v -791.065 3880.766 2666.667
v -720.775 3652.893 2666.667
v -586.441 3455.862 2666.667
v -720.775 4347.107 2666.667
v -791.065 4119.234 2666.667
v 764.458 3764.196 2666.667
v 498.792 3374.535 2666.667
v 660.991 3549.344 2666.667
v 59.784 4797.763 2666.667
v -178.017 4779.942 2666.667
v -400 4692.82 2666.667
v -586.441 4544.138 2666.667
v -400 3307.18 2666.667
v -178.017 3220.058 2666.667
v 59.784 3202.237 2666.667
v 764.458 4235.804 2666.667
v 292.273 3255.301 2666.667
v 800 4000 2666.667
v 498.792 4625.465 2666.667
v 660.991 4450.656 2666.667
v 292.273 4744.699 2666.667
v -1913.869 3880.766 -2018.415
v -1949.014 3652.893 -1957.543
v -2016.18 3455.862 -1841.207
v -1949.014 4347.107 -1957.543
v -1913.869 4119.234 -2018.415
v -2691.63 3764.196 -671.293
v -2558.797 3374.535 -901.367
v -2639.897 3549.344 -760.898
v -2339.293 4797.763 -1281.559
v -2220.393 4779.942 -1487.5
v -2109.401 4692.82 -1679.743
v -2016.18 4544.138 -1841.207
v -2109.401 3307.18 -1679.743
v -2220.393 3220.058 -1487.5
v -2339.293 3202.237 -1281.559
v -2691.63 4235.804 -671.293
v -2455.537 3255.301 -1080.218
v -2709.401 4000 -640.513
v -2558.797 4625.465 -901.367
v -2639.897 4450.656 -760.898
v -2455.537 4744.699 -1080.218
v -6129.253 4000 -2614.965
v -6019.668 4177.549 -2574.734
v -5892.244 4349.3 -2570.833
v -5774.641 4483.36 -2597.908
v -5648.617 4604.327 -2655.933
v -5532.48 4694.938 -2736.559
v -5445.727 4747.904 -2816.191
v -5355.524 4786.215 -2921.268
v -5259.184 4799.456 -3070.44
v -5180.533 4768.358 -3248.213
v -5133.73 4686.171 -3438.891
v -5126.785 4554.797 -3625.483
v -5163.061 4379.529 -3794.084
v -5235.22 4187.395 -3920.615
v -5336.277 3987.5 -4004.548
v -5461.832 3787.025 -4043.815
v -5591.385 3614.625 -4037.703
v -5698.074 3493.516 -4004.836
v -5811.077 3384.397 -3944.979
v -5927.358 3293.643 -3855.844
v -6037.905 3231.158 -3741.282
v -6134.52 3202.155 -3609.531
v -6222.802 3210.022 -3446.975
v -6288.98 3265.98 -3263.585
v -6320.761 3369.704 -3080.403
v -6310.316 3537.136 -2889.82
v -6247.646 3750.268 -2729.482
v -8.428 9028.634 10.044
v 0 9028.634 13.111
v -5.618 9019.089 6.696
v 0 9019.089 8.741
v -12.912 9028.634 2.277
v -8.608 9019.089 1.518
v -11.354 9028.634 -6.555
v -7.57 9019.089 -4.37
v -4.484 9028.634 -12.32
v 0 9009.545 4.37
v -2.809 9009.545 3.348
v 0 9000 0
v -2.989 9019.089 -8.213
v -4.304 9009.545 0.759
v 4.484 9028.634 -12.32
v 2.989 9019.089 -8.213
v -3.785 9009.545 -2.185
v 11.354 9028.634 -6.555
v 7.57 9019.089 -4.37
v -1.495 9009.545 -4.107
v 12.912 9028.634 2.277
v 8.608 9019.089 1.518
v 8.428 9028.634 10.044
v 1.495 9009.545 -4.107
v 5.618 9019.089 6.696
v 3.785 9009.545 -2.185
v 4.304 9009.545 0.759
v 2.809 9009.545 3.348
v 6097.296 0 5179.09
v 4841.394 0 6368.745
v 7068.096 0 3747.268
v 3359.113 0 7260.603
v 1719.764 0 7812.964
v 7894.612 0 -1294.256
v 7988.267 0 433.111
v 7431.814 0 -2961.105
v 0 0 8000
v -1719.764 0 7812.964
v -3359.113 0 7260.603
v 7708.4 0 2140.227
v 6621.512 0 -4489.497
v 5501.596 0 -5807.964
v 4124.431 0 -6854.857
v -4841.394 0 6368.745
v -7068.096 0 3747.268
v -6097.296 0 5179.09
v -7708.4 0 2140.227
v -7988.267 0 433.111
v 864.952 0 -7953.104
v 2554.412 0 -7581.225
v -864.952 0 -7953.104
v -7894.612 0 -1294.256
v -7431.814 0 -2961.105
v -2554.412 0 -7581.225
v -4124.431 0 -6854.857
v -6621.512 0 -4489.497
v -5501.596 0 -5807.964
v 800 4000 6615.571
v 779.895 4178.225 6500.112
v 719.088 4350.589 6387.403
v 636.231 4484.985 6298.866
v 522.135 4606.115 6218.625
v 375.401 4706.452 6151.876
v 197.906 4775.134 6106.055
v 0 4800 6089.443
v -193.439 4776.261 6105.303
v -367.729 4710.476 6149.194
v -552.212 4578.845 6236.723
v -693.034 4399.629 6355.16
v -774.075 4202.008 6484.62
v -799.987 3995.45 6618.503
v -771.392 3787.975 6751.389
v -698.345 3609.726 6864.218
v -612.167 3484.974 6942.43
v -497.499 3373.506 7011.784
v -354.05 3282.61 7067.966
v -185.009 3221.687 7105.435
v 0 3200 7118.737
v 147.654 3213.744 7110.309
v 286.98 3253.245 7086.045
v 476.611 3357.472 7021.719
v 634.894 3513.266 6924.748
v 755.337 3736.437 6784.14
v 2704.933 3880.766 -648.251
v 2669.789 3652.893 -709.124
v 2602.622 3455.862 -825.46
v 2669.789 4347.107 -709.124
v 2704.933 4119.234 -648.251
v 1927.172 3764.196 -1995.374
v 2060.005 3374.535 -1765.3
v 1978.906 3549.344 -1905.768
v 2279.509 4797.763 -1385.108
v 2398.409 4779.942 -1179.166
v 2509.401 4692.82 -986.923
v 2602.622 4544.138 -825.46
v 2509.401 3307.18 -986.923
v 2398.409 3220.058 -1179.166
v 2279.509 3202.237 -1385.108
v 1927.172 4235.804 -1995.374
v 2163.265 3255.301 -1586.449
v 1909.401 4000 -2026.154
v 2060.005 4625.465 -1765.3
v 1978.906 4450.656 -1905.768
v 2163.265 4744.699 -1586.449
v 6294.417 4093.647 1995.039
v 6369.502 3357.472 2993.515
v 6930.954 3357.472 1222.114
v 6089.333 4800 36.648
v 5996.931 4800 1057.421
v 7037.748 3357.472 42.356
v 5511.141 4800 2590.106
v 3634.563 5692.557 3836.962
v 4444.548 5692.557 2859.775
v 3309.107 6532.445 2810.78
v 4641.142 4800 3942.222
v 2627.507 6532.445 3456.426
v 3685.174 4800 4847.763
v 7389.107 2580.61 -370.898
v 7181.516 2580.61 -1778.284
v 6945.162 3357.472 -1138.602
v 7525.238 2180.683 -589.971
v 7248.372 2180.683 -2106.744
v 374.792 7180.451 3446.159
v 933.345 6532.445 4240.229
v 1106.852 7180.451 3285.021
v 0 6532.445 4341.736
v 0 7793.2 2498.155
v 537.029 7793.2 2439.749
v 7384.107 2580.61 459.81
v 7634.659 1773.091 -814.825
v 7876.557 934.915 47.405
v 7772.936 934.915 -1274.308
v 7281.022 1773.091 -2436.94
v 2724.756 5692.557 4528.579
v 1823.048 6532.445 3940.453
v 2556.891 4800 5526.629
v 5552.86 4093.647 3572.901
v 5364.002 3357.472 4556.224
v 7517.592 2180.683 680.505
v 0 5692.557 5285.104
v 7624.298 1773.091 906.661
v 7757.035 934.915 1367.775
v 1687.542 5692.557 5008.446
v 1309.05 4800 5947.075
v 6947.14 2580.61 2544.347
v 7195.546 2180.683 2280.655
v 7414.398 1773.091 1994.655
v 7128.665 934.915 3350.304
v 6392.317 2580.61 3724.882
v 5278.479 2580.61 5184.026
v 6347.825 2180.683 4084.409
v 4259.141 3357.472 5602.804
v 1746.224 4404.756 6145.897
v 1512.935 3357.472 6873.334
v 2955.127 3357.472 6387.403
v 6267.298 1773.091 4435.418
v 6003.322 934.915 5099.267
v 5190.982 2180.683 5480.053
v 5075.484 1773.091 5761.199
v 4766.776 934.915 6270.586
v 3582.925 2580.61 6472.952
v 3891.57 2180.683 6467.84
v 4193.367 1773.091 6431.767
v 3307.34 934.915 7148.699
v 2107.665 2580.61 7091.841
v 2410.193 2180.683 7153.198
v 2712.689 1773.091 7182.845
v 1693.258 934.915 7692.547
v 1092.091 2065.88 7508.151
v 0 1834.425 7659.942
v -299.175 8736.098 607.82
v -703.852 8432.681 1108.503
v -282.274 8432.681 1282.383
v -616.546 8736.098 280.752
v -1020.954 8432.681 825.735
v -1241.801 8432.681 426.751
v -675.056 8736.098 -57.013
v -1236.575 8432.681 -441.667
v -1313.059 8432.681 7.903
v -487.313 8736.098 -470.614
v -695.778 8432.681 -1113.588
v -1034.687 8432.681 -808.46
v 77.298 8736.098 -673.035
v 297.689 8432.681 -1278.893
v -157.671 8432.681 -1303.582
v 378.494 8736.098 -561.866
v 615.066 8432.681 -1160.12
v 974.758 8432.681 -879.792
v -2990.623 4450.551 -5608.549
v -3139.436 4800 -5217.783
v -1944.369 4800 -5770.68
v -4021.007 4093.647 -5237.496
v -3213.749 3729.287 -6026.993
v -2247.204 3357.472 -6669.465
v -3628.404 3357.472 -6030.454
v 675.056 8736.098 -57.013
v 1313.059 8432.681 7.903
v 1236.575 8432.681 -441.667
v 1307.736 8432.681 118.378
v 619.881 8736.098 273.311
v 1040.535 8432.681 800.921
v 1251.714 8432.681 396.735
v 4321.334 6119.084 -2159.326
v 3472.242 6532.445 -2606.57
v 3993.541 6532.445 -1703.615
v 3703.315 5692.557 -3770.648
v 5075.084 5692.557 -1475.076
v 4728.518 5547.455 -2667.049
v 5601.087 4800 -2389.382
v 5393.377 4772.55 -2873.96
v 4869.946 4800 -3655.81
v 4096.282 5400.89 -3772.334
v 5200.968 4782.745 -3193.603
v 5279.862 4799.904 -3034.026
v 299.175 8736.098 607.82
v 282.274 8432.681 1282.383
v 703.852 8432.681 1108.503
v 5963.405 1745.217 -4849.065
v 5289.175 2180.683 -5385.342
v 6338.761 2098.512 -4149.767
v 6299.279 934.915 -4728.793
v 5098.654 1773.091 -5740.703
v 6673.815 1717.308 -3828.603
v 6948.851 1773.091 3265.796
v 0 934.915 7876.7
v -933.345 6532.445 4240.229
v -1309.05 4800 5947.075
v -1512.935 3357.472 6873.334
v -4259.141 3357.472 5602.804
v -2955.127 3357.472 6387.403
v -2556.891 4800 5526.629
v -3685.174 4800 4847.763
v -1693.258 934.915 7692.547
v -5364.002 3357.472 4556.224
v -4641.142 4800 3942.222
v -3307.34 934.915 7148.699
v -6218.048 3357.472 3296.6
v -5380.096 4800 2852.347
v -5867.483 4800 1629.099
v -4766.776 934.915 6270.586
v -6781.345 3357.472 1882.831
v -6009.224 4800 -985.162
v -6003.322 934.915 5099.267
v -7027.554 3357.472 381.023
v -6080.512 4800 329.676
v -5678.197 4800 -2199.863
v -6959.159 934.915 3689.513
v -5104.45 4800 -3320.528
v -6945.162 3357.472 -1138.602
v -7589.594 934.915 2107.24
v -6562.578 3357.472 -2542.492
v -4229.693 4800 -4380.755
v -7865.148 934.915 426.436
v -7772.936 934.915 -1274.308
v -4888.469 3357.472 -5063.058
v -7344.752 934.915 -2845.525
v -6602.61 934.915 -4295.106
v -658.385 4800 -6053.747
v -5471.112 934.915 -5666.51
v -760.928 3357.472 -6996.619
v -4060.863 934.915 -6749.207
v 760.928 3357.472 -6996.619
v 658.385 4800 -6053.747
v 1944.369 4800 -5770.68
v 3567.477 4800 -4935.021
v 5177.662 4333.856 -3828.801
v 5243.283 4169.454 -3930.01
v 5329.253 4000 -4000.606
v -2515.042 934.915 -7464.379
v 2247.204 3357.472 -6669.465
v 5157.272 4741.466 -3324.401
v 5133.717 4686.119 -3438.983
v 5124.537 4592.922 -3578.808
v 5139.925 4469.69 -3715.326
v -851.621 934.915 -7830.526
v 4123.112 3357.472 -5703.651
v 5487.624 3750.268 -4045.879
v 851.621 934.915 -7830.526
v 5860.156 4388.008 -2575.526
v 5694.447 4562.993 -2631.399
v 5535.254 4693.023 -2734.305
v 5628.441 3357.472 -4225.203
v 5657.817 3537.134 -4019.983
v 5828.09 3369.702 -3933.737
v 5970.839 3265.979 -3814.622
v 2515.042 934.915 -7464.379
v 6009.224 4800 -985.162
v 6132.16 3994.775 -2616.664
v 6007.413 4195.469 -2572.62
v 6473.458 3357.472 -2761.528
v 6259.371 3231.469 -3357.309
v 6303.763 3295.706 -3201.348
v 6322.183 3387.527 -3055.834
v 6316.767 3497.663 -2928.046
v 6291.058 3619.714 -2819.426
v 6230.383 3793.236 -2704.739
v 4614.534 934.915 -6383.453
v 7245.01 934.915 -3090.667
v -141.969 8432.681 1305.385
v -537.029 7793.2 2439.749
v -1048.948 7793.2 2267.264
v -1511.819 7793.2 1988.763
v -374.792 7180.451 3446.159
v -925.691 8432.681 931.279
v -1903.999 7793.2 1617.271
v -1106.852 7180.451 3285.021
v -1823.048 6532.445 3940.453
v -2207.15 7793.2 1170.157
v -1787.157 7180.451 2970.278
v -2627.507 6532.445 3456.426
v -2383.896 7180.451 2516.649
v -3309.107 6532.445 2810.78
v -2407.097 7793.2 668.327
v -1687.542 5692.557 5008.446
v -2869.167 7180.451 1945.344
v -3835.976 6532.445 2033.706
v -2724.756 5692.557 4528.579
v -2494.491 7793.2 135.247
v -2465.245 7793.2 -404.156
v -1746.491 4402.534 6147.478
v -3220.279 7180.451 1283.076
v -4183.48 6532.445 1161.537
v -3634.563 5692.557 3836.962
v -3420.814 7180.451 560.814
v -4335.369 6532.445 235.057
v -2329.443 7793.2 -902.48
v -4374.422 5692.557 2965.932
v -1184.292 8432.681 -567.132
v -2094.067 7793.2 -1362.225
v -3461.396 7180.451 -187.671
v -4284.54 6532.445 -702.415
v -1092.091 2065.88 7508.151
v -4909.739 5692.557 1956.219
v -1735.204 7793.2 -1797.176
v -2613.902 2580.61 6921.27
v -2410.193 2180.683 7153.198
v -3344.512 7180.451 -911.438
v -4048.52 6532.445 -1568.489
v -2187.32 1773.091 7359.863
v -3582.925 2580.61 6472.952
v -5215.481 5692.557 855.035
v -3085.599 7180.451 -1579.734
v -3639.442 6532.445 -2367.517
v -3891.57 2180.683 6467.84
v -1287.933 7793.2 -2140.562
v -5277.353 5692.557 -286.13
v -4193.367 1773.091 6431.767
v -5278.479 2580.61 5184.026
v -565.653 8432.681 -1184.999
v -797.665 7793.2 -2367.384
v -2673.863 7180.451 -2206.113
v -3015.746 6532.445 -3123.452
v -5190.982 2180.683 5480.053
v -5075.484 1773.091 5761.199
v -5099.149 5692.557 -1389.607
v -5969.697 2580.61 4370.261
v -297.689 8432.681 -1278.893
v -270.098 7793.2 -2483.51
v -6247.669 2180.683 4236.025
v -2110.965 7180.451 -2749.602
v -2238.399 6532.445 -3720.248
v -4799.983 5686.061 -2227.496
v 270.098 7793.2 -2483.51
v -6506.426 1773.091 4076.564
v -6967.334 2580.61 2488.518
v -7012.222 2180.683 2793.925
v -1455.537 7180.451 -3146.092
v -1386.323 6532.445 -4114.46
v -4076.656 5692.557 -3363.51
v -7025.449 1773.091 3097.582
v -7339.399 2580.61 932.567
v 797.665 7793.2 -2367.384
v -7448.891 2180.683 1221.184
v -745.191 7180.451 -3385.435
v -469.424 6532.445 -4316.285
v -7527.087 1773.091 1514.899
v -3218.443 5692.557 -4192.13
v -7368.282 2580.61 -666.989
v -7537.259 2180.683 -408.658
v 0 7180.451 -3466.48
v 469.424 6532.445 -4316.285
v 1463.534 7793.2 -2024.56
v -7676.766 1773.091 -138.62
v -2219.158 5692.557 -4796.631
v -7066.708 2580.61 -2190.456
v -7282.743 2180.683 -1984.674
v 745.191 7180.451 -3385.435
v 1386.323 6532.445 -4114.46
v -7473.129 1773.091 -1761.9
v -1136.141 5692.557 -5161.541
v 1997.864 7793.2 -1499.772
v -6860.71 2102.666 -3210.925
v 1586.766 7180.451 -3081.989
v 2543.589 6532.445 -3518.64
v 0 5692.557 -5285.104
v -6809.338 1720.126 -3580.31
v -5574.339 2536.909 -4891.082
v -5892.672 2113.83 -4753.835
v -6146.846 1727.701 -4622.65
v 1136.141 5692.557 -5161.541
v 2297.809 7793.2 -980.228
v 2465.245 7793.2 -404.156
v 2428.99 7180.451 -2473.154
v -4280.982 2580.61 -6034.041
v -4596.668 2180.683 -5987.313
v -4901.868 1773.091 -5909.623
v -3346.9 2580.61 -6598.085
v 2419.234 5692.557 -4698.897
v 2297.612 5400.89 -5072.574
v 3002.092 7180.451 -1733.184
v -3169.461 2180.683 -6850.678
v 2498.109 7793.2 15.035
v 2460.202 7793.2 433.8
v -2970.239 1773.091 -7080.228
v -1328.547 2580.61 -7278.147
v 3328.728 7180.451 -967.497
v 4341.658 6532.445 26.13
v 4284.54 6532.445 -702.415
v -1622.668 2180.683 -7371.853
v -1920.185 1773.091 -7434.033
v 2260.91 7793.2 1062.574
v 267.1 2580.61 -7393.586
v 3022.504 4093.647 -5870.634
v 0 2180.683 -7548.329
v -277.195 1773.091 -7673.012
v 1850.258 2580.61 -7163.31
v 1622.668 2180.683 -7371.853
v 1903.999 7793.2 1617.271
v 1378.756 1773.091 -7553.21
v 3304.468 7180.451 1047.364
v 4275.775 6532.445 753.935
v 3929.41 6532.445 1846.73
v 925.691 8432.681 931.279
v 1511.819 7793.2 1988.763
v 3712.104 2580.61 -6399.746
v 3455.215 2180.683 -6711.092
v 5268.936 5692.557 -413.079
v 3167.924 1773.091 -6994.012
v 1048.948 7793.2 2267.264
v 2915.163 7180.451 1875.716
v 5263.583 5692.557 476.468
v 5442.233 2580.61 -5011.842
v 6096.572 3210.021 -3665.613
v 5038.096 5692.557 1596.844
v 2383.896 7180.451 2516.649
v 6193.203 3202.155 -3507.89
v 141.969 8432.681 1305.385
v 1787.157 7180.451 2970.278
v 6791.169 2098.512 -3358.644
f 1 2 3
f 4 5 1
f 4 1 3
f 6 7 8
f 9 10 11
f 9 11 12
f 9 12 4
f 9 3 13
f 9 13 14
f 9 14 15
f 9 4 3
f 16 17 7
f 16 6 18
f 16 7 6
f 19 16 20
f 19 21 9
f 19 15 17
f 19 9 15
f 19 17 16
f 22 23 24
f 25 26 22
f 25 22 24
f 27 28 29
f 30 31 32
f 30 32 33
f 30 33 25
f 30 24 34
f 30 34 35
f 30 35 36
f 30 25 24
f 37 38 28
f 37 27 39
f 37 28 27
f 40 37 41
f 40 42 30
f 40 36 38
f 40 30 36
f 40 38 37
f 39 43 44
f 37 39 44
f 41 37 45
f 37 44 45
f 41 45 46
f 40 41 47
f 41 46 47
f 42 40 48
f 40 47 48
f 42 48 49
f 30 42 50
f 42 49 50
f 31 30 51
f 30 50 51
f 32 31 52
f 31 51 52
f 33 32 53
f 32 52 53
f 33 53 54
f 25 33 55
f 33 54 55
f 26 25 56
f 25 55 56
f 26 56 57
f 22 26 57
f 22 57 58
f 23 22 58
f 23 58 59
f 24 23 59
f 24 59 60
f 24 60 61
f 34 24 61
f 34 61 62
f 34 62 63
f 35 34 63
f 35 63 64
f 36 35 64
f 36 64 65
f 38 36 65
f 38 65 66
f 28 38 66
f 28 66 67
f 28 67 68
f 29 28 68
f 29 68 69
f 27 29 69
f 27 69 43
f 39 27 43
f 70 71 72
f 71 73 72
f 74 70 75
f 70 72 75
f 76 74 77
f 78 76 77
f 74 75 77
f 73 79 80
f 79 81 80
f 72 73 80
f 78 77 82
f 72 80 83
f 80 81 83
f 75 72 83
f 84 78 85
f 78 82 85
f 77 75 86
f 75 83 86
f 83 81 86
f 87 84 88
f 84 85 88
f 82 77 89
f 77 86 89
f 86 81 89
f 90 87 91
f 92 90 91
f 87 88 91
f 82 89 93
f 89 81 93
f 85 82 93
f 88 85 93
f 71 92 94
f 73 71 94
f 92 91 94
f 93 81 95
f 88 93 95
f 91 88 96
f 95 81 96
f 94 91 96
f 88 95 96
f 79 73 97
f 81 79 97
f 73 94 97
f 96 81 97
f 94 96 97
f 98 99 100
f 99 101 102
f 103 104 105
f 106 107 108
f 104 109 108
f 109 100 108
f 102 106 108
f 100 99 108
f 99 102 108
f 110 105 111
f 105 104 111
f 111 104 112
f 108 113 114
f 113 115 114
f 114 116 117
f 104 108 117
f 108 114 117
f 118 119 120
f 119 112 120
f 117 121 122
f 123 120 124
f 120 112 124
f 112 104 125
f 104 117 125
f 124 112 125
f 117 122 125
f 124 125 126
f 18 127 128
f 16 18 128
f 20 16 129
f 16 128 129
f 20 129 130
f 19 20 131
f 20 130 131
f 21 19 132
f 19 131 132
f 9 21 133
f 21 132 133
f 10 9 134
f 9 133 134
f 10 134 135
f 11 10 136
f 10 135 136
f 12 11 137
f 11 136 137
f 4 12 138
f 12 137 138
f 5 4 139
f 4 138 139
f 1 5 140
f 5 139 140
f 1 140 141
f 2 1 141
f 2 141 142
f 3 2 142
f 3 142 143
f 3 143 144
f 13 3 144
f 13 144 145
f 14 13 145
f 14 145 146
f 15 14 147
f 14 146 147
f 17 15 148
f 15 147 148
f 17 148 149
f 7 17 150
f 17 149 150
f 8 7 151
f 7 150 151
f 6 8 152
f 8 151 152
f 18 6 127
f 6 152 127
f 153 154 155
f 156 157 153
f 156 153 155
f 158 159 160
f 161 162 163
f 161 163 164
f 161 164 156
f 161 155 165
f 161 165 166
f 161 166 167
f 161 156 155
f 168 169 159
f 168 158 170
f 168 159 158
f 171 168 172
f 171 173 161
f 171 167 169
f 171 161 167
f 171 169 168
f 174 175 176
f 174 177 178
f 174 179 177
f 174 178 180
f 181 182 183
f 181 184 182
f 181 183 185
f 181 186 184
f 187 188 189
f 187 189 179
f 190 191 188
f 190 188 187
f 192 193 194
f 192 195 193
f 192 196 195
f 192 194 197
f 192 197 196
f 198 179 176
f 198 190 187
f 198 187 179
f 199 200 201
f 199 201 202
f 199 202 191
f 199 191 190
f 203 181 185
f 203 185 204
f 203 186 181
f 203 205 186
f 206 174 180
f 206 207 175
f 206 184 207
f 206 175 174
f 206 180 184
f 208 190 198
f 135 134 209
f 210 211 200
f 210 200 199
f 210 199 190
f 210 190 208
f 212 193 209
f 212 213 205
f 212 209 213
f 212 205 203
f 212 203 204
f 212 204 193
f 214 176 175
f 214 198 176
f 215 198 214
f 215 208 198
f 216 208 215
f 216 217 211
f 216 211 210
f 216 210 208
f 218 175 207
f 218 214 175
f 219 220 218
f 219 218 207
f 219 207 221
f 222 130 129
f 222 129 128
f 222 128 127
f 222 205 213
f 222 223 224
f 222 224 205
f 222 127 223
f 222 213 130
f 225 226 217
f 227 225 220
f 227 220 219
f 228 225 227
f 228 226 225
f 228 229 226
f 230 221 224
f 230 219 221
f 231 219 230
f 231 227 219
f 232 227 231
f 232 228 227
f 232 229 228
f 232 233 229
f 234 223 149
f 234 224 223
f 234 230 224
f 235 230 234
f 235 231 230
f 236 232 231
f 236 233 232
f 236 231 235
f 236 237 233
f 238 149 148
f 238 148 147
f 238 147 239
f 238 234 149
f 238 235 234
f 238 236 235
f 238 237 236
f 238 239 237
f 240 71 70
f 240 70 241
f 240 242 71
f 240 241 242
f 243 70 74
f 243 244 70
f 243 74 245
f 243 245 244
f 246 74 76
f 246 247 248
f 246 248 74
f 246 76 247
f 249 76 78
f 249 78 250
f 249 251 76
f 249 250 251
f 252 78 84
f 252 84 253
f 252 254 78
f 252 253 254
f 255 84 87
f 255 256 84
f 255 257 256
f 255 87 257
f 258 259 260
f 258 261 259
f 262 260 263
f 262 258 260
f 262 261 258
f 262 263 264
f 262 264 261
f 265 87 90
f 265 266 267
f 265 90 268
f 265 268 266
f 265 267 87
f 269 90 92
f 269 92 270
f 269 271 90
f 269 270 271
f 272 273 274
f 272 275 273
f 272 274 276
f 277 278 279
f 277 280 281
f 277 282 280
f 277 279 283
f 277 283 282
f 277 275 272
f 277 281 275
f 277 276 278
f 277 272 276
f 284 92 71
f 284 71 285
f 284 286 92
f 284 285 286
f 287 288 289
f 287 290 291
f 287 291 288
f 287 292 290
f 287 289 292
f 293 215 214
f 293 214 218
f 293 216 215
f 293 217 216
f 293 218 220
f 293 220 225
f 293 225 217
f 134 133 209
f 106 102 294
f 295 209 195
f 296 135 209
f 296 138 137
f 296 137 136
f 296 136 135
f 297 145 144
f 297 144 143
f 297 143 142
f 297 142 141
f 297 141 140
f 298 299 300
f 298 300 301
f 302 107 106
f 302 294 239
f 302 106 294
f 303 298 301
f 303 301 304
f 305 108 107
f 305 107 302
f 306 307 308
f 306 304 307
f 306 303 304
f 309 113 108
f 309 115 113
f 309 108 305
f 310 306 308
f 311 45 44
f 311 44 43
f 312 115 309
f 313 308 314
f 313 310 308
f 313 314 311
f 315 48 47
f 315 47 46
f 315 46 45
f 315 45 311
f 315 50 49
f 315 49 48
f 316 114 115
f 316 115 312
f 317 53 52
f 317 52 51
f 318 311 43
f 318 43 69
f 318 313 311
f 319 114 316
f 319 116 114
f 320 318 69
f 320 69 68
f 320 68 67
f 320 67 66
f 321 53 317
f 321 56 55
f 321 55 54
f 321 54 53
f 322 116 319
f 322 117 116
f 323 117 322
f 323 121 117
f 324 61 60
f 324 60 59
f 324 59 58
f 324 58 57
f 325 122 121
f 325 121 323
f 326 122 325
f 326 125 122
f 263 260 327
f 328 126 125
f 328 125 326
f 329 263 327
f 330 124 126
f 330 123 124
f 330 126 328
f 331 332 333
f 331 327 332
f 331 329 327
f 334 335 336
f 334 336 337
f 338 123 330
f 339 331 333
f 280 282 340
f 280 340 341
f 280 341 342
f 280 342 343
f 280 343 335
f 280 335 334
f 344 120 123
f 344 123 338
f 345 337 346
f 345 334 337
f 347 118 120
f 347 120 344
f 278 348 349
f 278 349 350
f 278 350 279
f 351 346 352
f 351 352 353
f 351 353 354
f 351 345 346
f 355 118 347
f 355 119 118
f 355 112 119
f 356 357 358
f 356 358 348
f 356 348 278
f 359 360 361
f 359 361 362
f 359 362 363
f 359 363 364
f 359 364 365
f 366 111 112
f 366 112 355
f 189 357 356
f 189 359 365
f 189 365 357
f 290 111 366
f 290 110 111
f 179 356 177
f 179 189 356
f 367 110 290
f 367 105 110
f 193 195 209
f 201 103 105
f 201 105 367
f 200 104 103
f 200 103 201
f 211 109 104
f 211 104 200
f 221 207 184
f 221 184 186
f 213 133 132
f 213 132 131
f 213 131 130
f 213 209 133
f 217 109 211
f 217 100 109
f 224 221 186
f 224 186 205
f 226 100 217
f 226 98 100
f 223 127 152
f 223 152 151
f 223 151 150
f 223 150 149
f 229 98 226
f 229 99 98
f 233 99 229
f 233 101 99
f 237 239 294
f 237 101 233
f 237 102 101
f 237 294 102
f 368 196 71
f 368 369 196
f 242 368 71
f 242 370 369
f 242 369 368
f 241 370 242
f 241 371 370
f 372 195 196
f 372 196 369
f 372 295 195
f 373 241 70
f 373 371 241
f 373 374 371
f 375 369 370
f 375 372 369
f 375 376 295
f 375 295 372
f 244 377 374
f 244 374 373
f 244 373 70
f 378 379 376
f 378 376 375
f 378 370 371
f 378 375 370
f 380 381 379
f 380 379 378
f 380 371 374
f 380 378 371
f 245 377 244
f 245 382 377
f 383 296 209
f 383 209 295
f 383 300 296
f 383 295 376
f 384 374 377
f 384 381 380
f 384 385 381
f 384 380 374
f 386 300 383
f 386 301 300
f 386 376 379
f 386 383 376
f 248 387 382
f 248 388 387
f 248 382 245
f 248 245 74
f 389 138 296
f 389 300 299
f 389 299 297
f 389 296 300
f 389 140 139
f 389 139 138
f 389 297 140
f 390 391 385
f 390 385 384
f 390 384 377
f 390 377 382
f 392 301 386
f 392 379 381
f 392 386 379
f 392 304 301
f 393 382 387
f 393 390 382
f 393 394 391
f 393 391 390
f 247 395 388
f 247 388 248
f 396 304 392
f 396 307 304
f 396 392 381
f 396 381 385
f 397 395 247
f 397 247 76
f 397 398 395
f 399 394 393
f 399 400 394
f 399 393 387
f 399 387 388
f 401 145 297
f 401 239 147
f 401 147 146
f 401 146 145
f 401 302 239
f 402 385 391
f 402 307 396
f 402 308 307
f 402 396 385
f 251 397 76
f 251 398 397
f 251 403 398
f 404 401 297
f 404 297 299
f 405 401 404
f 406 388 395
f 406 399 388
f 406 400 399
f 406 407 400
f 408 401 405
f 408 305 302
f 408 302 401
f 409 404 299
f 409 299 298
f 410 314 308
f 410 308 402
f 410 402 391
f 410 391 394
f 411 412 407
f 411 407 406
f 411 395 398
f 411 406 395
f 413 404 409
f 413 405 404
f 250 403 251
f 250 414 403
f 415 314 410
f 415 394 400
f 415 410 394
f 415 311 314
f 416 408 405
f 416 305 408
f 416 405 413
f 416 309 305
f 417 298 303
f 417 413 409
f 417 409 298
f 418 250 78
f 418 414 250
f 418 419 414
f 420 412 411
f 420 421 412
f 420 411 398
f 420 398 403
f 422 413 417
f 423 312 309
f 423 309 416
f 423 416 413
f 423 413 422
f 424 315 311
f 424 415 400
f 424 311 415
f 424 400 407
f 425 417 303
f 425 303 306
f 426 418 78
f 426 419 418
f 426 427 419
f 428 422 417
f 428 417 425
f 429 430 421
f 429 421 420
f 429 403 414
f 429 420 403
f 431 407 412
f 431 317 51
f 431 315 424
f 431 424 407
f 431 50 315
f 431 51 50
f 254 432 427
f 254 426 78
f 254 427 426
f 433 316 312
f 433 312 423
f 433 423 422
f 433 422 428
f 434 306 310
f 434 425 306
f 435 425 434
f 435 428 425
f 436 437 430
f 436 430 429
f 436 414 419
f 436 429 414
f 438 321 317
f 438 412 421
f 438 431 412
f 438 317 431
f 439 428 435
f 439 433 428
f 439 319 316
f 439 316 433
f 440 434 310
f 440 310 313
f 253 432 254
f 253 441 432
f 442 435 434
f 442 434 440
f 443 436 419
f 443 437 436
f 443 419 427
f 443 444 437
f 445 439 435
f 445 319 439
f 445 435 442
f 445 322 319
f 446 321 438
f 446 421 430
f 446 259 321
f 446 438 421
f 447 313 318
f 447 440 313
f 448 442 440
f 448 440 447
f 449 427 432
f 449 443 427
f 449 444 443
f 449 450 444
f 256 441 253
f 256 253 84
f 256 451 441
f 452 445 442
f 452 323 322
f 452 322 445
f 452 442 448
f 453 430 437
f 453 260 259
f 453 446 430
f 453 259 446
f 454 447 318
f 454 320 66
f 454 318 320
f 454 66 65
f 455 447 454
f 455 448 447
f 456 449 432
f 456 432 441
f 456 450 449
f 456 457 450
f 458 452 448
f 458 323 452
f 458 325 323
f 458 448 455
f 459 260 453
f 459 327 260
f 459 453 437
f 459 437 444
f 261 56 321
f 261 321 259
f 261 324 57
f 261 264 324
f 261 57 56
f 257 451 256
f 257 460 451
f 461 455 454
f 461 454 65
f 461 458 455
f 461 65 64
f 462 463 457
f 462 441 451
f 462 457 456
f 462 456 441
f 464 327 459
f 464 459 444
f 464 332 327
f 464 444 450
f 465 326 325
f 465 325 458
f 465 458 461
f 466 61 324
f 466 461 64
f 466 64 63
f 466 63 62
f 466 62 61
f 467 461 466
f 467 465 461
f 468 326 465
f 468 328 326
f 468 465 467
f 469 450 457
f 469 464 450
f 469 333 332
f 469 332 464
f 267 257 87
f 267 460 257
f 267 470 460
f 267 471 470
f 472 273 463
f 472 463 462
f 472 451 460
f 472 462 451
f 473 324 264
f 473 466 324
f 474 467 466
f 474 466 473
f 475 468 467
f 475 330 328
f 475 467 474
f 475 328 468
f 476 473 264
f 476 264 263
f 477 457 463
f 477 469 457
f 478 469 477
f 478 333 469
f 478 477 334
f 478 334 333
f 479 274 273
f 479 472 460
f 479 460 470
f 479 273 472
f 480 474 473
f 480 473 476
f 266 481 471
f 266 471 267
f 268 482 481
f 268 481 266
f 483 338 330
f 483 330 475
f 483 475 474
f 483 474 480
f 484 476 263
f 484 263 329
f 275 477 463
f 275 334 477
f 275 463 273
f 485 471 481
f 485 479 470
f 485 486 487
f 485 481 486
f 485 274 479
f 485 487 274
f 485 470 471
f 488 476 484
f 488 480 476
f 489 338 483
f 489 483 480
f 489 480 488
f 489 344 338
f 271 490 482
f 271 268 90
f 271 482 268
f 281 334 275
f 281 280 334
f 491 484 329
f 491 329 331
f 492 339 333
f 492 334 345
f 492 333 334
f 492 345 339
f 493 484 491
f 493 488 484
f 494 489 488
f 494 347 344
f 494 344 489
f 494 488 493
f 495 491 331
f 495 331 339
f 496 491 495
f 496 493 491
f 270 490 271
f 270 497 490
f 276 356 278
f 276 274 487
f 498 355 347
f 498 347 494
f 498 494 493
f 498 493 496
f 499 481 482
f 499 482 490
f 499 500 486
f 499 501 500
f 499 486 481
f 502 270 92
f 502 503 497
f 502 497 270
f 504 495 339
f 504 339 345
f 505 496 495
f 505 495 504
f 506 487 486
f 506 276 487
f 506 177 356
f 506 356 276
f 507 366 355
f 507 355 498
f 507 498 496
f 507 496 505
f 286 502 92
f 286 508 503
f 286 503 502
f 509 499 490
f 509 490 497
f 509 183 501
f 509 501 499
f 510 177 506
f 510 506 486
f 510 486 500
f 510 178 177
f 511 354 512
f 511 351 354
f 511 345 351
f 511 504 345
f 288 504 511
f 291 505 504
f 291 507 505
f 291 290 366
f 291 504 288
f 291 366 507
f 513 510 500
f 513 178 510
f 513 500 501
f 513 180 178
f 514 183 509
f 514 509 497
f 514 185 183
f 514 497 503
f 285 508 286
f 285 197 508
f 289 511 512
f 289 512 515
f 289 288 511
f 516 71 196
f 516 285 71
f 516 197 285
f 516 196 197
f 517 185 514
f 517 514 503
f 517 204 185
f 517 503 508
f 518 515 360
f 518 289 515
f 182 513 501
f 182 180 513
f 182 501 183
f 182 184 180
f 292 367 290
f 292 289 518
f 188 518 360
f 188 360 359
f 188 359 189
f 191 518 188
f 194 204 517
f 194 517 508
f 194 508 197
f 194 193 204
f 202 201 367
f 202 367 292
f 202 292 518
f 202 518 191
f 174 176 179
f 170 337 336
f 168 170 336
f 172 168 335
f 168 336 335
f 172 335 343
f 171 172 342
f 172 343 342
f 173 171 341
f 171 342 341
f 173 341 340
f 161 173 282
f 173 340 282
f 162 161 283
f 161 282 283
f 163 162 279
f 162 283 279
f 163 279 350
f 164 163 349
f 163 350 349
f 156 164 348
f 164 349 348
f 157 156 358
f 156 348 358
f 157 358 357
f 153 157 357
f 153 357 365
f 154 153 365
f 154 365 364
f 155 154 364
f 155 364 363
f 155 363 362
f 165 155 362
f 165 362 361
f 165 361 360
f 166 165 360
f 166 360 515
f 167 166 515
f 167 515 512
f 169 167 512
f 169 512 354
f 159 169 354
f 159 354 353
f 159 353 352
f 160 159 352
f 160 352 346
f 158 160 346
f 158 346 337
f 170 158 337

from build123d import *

# Parameters (mm, degrees)
SKETCH2_R          = 800
CUT_EXTRUDE1_DEPTH = 5333.333333333
CIRPATTERN1_COUNT  = 3


with BuildPart() as part:
    # Sketch1 → Revolve1 (revolve)
    with BuildSketch(Plane.XY, mode=Mode.PRIVATE) as revolve1_sk:
        with BuildLine():
            Line((0, 0), (8000, 0))
            add(Edge.make_bspline(
                [(13.110887759, 9028.633574294), (7529.852626364, 5849.053131887), (8000, 0)],
                knots=[0, 0, 0, 0.656149397, 0.656149397, 0.656149397], degree=2))
            Line((13.110887759, 9028.633574294), (0, 9000))
            Line((0, 9000), (0, 0))
        make_face()
    revolve(revolve1_sk.sketch.rotate(Axis((0, 52.187321795, 0), (0, -1, 0)), 90), axis=Axis((0, 52.187321795, 0), (0, -1, 0)))

    # Sketch2 → Cut-Extrude1 (cut)
    with BuildSketch(Plane.XY.offset(8000)):
        with Locations((0, 4000)):
            Circle(SKETCH2_R)
    cut_extrude1 = extrude(amount=-CUT_EXTRUDE1_DEPTH, mode=Mode.SUBTRACT)

    # CirPattern1: Cut-Extrude1 ×3 about axis
    cirpattern1_axis = Axis((0, 0, 0), (0, 1, 0))
    for i in range(1, CIRPATTERN1_COUNT):
        add(cut_extrude1.rotate(cirpattern1_axis, i * 360 / CIRPATTERN1_COUNT), mode=Mode.SUBTRACT)


solid = part.part
